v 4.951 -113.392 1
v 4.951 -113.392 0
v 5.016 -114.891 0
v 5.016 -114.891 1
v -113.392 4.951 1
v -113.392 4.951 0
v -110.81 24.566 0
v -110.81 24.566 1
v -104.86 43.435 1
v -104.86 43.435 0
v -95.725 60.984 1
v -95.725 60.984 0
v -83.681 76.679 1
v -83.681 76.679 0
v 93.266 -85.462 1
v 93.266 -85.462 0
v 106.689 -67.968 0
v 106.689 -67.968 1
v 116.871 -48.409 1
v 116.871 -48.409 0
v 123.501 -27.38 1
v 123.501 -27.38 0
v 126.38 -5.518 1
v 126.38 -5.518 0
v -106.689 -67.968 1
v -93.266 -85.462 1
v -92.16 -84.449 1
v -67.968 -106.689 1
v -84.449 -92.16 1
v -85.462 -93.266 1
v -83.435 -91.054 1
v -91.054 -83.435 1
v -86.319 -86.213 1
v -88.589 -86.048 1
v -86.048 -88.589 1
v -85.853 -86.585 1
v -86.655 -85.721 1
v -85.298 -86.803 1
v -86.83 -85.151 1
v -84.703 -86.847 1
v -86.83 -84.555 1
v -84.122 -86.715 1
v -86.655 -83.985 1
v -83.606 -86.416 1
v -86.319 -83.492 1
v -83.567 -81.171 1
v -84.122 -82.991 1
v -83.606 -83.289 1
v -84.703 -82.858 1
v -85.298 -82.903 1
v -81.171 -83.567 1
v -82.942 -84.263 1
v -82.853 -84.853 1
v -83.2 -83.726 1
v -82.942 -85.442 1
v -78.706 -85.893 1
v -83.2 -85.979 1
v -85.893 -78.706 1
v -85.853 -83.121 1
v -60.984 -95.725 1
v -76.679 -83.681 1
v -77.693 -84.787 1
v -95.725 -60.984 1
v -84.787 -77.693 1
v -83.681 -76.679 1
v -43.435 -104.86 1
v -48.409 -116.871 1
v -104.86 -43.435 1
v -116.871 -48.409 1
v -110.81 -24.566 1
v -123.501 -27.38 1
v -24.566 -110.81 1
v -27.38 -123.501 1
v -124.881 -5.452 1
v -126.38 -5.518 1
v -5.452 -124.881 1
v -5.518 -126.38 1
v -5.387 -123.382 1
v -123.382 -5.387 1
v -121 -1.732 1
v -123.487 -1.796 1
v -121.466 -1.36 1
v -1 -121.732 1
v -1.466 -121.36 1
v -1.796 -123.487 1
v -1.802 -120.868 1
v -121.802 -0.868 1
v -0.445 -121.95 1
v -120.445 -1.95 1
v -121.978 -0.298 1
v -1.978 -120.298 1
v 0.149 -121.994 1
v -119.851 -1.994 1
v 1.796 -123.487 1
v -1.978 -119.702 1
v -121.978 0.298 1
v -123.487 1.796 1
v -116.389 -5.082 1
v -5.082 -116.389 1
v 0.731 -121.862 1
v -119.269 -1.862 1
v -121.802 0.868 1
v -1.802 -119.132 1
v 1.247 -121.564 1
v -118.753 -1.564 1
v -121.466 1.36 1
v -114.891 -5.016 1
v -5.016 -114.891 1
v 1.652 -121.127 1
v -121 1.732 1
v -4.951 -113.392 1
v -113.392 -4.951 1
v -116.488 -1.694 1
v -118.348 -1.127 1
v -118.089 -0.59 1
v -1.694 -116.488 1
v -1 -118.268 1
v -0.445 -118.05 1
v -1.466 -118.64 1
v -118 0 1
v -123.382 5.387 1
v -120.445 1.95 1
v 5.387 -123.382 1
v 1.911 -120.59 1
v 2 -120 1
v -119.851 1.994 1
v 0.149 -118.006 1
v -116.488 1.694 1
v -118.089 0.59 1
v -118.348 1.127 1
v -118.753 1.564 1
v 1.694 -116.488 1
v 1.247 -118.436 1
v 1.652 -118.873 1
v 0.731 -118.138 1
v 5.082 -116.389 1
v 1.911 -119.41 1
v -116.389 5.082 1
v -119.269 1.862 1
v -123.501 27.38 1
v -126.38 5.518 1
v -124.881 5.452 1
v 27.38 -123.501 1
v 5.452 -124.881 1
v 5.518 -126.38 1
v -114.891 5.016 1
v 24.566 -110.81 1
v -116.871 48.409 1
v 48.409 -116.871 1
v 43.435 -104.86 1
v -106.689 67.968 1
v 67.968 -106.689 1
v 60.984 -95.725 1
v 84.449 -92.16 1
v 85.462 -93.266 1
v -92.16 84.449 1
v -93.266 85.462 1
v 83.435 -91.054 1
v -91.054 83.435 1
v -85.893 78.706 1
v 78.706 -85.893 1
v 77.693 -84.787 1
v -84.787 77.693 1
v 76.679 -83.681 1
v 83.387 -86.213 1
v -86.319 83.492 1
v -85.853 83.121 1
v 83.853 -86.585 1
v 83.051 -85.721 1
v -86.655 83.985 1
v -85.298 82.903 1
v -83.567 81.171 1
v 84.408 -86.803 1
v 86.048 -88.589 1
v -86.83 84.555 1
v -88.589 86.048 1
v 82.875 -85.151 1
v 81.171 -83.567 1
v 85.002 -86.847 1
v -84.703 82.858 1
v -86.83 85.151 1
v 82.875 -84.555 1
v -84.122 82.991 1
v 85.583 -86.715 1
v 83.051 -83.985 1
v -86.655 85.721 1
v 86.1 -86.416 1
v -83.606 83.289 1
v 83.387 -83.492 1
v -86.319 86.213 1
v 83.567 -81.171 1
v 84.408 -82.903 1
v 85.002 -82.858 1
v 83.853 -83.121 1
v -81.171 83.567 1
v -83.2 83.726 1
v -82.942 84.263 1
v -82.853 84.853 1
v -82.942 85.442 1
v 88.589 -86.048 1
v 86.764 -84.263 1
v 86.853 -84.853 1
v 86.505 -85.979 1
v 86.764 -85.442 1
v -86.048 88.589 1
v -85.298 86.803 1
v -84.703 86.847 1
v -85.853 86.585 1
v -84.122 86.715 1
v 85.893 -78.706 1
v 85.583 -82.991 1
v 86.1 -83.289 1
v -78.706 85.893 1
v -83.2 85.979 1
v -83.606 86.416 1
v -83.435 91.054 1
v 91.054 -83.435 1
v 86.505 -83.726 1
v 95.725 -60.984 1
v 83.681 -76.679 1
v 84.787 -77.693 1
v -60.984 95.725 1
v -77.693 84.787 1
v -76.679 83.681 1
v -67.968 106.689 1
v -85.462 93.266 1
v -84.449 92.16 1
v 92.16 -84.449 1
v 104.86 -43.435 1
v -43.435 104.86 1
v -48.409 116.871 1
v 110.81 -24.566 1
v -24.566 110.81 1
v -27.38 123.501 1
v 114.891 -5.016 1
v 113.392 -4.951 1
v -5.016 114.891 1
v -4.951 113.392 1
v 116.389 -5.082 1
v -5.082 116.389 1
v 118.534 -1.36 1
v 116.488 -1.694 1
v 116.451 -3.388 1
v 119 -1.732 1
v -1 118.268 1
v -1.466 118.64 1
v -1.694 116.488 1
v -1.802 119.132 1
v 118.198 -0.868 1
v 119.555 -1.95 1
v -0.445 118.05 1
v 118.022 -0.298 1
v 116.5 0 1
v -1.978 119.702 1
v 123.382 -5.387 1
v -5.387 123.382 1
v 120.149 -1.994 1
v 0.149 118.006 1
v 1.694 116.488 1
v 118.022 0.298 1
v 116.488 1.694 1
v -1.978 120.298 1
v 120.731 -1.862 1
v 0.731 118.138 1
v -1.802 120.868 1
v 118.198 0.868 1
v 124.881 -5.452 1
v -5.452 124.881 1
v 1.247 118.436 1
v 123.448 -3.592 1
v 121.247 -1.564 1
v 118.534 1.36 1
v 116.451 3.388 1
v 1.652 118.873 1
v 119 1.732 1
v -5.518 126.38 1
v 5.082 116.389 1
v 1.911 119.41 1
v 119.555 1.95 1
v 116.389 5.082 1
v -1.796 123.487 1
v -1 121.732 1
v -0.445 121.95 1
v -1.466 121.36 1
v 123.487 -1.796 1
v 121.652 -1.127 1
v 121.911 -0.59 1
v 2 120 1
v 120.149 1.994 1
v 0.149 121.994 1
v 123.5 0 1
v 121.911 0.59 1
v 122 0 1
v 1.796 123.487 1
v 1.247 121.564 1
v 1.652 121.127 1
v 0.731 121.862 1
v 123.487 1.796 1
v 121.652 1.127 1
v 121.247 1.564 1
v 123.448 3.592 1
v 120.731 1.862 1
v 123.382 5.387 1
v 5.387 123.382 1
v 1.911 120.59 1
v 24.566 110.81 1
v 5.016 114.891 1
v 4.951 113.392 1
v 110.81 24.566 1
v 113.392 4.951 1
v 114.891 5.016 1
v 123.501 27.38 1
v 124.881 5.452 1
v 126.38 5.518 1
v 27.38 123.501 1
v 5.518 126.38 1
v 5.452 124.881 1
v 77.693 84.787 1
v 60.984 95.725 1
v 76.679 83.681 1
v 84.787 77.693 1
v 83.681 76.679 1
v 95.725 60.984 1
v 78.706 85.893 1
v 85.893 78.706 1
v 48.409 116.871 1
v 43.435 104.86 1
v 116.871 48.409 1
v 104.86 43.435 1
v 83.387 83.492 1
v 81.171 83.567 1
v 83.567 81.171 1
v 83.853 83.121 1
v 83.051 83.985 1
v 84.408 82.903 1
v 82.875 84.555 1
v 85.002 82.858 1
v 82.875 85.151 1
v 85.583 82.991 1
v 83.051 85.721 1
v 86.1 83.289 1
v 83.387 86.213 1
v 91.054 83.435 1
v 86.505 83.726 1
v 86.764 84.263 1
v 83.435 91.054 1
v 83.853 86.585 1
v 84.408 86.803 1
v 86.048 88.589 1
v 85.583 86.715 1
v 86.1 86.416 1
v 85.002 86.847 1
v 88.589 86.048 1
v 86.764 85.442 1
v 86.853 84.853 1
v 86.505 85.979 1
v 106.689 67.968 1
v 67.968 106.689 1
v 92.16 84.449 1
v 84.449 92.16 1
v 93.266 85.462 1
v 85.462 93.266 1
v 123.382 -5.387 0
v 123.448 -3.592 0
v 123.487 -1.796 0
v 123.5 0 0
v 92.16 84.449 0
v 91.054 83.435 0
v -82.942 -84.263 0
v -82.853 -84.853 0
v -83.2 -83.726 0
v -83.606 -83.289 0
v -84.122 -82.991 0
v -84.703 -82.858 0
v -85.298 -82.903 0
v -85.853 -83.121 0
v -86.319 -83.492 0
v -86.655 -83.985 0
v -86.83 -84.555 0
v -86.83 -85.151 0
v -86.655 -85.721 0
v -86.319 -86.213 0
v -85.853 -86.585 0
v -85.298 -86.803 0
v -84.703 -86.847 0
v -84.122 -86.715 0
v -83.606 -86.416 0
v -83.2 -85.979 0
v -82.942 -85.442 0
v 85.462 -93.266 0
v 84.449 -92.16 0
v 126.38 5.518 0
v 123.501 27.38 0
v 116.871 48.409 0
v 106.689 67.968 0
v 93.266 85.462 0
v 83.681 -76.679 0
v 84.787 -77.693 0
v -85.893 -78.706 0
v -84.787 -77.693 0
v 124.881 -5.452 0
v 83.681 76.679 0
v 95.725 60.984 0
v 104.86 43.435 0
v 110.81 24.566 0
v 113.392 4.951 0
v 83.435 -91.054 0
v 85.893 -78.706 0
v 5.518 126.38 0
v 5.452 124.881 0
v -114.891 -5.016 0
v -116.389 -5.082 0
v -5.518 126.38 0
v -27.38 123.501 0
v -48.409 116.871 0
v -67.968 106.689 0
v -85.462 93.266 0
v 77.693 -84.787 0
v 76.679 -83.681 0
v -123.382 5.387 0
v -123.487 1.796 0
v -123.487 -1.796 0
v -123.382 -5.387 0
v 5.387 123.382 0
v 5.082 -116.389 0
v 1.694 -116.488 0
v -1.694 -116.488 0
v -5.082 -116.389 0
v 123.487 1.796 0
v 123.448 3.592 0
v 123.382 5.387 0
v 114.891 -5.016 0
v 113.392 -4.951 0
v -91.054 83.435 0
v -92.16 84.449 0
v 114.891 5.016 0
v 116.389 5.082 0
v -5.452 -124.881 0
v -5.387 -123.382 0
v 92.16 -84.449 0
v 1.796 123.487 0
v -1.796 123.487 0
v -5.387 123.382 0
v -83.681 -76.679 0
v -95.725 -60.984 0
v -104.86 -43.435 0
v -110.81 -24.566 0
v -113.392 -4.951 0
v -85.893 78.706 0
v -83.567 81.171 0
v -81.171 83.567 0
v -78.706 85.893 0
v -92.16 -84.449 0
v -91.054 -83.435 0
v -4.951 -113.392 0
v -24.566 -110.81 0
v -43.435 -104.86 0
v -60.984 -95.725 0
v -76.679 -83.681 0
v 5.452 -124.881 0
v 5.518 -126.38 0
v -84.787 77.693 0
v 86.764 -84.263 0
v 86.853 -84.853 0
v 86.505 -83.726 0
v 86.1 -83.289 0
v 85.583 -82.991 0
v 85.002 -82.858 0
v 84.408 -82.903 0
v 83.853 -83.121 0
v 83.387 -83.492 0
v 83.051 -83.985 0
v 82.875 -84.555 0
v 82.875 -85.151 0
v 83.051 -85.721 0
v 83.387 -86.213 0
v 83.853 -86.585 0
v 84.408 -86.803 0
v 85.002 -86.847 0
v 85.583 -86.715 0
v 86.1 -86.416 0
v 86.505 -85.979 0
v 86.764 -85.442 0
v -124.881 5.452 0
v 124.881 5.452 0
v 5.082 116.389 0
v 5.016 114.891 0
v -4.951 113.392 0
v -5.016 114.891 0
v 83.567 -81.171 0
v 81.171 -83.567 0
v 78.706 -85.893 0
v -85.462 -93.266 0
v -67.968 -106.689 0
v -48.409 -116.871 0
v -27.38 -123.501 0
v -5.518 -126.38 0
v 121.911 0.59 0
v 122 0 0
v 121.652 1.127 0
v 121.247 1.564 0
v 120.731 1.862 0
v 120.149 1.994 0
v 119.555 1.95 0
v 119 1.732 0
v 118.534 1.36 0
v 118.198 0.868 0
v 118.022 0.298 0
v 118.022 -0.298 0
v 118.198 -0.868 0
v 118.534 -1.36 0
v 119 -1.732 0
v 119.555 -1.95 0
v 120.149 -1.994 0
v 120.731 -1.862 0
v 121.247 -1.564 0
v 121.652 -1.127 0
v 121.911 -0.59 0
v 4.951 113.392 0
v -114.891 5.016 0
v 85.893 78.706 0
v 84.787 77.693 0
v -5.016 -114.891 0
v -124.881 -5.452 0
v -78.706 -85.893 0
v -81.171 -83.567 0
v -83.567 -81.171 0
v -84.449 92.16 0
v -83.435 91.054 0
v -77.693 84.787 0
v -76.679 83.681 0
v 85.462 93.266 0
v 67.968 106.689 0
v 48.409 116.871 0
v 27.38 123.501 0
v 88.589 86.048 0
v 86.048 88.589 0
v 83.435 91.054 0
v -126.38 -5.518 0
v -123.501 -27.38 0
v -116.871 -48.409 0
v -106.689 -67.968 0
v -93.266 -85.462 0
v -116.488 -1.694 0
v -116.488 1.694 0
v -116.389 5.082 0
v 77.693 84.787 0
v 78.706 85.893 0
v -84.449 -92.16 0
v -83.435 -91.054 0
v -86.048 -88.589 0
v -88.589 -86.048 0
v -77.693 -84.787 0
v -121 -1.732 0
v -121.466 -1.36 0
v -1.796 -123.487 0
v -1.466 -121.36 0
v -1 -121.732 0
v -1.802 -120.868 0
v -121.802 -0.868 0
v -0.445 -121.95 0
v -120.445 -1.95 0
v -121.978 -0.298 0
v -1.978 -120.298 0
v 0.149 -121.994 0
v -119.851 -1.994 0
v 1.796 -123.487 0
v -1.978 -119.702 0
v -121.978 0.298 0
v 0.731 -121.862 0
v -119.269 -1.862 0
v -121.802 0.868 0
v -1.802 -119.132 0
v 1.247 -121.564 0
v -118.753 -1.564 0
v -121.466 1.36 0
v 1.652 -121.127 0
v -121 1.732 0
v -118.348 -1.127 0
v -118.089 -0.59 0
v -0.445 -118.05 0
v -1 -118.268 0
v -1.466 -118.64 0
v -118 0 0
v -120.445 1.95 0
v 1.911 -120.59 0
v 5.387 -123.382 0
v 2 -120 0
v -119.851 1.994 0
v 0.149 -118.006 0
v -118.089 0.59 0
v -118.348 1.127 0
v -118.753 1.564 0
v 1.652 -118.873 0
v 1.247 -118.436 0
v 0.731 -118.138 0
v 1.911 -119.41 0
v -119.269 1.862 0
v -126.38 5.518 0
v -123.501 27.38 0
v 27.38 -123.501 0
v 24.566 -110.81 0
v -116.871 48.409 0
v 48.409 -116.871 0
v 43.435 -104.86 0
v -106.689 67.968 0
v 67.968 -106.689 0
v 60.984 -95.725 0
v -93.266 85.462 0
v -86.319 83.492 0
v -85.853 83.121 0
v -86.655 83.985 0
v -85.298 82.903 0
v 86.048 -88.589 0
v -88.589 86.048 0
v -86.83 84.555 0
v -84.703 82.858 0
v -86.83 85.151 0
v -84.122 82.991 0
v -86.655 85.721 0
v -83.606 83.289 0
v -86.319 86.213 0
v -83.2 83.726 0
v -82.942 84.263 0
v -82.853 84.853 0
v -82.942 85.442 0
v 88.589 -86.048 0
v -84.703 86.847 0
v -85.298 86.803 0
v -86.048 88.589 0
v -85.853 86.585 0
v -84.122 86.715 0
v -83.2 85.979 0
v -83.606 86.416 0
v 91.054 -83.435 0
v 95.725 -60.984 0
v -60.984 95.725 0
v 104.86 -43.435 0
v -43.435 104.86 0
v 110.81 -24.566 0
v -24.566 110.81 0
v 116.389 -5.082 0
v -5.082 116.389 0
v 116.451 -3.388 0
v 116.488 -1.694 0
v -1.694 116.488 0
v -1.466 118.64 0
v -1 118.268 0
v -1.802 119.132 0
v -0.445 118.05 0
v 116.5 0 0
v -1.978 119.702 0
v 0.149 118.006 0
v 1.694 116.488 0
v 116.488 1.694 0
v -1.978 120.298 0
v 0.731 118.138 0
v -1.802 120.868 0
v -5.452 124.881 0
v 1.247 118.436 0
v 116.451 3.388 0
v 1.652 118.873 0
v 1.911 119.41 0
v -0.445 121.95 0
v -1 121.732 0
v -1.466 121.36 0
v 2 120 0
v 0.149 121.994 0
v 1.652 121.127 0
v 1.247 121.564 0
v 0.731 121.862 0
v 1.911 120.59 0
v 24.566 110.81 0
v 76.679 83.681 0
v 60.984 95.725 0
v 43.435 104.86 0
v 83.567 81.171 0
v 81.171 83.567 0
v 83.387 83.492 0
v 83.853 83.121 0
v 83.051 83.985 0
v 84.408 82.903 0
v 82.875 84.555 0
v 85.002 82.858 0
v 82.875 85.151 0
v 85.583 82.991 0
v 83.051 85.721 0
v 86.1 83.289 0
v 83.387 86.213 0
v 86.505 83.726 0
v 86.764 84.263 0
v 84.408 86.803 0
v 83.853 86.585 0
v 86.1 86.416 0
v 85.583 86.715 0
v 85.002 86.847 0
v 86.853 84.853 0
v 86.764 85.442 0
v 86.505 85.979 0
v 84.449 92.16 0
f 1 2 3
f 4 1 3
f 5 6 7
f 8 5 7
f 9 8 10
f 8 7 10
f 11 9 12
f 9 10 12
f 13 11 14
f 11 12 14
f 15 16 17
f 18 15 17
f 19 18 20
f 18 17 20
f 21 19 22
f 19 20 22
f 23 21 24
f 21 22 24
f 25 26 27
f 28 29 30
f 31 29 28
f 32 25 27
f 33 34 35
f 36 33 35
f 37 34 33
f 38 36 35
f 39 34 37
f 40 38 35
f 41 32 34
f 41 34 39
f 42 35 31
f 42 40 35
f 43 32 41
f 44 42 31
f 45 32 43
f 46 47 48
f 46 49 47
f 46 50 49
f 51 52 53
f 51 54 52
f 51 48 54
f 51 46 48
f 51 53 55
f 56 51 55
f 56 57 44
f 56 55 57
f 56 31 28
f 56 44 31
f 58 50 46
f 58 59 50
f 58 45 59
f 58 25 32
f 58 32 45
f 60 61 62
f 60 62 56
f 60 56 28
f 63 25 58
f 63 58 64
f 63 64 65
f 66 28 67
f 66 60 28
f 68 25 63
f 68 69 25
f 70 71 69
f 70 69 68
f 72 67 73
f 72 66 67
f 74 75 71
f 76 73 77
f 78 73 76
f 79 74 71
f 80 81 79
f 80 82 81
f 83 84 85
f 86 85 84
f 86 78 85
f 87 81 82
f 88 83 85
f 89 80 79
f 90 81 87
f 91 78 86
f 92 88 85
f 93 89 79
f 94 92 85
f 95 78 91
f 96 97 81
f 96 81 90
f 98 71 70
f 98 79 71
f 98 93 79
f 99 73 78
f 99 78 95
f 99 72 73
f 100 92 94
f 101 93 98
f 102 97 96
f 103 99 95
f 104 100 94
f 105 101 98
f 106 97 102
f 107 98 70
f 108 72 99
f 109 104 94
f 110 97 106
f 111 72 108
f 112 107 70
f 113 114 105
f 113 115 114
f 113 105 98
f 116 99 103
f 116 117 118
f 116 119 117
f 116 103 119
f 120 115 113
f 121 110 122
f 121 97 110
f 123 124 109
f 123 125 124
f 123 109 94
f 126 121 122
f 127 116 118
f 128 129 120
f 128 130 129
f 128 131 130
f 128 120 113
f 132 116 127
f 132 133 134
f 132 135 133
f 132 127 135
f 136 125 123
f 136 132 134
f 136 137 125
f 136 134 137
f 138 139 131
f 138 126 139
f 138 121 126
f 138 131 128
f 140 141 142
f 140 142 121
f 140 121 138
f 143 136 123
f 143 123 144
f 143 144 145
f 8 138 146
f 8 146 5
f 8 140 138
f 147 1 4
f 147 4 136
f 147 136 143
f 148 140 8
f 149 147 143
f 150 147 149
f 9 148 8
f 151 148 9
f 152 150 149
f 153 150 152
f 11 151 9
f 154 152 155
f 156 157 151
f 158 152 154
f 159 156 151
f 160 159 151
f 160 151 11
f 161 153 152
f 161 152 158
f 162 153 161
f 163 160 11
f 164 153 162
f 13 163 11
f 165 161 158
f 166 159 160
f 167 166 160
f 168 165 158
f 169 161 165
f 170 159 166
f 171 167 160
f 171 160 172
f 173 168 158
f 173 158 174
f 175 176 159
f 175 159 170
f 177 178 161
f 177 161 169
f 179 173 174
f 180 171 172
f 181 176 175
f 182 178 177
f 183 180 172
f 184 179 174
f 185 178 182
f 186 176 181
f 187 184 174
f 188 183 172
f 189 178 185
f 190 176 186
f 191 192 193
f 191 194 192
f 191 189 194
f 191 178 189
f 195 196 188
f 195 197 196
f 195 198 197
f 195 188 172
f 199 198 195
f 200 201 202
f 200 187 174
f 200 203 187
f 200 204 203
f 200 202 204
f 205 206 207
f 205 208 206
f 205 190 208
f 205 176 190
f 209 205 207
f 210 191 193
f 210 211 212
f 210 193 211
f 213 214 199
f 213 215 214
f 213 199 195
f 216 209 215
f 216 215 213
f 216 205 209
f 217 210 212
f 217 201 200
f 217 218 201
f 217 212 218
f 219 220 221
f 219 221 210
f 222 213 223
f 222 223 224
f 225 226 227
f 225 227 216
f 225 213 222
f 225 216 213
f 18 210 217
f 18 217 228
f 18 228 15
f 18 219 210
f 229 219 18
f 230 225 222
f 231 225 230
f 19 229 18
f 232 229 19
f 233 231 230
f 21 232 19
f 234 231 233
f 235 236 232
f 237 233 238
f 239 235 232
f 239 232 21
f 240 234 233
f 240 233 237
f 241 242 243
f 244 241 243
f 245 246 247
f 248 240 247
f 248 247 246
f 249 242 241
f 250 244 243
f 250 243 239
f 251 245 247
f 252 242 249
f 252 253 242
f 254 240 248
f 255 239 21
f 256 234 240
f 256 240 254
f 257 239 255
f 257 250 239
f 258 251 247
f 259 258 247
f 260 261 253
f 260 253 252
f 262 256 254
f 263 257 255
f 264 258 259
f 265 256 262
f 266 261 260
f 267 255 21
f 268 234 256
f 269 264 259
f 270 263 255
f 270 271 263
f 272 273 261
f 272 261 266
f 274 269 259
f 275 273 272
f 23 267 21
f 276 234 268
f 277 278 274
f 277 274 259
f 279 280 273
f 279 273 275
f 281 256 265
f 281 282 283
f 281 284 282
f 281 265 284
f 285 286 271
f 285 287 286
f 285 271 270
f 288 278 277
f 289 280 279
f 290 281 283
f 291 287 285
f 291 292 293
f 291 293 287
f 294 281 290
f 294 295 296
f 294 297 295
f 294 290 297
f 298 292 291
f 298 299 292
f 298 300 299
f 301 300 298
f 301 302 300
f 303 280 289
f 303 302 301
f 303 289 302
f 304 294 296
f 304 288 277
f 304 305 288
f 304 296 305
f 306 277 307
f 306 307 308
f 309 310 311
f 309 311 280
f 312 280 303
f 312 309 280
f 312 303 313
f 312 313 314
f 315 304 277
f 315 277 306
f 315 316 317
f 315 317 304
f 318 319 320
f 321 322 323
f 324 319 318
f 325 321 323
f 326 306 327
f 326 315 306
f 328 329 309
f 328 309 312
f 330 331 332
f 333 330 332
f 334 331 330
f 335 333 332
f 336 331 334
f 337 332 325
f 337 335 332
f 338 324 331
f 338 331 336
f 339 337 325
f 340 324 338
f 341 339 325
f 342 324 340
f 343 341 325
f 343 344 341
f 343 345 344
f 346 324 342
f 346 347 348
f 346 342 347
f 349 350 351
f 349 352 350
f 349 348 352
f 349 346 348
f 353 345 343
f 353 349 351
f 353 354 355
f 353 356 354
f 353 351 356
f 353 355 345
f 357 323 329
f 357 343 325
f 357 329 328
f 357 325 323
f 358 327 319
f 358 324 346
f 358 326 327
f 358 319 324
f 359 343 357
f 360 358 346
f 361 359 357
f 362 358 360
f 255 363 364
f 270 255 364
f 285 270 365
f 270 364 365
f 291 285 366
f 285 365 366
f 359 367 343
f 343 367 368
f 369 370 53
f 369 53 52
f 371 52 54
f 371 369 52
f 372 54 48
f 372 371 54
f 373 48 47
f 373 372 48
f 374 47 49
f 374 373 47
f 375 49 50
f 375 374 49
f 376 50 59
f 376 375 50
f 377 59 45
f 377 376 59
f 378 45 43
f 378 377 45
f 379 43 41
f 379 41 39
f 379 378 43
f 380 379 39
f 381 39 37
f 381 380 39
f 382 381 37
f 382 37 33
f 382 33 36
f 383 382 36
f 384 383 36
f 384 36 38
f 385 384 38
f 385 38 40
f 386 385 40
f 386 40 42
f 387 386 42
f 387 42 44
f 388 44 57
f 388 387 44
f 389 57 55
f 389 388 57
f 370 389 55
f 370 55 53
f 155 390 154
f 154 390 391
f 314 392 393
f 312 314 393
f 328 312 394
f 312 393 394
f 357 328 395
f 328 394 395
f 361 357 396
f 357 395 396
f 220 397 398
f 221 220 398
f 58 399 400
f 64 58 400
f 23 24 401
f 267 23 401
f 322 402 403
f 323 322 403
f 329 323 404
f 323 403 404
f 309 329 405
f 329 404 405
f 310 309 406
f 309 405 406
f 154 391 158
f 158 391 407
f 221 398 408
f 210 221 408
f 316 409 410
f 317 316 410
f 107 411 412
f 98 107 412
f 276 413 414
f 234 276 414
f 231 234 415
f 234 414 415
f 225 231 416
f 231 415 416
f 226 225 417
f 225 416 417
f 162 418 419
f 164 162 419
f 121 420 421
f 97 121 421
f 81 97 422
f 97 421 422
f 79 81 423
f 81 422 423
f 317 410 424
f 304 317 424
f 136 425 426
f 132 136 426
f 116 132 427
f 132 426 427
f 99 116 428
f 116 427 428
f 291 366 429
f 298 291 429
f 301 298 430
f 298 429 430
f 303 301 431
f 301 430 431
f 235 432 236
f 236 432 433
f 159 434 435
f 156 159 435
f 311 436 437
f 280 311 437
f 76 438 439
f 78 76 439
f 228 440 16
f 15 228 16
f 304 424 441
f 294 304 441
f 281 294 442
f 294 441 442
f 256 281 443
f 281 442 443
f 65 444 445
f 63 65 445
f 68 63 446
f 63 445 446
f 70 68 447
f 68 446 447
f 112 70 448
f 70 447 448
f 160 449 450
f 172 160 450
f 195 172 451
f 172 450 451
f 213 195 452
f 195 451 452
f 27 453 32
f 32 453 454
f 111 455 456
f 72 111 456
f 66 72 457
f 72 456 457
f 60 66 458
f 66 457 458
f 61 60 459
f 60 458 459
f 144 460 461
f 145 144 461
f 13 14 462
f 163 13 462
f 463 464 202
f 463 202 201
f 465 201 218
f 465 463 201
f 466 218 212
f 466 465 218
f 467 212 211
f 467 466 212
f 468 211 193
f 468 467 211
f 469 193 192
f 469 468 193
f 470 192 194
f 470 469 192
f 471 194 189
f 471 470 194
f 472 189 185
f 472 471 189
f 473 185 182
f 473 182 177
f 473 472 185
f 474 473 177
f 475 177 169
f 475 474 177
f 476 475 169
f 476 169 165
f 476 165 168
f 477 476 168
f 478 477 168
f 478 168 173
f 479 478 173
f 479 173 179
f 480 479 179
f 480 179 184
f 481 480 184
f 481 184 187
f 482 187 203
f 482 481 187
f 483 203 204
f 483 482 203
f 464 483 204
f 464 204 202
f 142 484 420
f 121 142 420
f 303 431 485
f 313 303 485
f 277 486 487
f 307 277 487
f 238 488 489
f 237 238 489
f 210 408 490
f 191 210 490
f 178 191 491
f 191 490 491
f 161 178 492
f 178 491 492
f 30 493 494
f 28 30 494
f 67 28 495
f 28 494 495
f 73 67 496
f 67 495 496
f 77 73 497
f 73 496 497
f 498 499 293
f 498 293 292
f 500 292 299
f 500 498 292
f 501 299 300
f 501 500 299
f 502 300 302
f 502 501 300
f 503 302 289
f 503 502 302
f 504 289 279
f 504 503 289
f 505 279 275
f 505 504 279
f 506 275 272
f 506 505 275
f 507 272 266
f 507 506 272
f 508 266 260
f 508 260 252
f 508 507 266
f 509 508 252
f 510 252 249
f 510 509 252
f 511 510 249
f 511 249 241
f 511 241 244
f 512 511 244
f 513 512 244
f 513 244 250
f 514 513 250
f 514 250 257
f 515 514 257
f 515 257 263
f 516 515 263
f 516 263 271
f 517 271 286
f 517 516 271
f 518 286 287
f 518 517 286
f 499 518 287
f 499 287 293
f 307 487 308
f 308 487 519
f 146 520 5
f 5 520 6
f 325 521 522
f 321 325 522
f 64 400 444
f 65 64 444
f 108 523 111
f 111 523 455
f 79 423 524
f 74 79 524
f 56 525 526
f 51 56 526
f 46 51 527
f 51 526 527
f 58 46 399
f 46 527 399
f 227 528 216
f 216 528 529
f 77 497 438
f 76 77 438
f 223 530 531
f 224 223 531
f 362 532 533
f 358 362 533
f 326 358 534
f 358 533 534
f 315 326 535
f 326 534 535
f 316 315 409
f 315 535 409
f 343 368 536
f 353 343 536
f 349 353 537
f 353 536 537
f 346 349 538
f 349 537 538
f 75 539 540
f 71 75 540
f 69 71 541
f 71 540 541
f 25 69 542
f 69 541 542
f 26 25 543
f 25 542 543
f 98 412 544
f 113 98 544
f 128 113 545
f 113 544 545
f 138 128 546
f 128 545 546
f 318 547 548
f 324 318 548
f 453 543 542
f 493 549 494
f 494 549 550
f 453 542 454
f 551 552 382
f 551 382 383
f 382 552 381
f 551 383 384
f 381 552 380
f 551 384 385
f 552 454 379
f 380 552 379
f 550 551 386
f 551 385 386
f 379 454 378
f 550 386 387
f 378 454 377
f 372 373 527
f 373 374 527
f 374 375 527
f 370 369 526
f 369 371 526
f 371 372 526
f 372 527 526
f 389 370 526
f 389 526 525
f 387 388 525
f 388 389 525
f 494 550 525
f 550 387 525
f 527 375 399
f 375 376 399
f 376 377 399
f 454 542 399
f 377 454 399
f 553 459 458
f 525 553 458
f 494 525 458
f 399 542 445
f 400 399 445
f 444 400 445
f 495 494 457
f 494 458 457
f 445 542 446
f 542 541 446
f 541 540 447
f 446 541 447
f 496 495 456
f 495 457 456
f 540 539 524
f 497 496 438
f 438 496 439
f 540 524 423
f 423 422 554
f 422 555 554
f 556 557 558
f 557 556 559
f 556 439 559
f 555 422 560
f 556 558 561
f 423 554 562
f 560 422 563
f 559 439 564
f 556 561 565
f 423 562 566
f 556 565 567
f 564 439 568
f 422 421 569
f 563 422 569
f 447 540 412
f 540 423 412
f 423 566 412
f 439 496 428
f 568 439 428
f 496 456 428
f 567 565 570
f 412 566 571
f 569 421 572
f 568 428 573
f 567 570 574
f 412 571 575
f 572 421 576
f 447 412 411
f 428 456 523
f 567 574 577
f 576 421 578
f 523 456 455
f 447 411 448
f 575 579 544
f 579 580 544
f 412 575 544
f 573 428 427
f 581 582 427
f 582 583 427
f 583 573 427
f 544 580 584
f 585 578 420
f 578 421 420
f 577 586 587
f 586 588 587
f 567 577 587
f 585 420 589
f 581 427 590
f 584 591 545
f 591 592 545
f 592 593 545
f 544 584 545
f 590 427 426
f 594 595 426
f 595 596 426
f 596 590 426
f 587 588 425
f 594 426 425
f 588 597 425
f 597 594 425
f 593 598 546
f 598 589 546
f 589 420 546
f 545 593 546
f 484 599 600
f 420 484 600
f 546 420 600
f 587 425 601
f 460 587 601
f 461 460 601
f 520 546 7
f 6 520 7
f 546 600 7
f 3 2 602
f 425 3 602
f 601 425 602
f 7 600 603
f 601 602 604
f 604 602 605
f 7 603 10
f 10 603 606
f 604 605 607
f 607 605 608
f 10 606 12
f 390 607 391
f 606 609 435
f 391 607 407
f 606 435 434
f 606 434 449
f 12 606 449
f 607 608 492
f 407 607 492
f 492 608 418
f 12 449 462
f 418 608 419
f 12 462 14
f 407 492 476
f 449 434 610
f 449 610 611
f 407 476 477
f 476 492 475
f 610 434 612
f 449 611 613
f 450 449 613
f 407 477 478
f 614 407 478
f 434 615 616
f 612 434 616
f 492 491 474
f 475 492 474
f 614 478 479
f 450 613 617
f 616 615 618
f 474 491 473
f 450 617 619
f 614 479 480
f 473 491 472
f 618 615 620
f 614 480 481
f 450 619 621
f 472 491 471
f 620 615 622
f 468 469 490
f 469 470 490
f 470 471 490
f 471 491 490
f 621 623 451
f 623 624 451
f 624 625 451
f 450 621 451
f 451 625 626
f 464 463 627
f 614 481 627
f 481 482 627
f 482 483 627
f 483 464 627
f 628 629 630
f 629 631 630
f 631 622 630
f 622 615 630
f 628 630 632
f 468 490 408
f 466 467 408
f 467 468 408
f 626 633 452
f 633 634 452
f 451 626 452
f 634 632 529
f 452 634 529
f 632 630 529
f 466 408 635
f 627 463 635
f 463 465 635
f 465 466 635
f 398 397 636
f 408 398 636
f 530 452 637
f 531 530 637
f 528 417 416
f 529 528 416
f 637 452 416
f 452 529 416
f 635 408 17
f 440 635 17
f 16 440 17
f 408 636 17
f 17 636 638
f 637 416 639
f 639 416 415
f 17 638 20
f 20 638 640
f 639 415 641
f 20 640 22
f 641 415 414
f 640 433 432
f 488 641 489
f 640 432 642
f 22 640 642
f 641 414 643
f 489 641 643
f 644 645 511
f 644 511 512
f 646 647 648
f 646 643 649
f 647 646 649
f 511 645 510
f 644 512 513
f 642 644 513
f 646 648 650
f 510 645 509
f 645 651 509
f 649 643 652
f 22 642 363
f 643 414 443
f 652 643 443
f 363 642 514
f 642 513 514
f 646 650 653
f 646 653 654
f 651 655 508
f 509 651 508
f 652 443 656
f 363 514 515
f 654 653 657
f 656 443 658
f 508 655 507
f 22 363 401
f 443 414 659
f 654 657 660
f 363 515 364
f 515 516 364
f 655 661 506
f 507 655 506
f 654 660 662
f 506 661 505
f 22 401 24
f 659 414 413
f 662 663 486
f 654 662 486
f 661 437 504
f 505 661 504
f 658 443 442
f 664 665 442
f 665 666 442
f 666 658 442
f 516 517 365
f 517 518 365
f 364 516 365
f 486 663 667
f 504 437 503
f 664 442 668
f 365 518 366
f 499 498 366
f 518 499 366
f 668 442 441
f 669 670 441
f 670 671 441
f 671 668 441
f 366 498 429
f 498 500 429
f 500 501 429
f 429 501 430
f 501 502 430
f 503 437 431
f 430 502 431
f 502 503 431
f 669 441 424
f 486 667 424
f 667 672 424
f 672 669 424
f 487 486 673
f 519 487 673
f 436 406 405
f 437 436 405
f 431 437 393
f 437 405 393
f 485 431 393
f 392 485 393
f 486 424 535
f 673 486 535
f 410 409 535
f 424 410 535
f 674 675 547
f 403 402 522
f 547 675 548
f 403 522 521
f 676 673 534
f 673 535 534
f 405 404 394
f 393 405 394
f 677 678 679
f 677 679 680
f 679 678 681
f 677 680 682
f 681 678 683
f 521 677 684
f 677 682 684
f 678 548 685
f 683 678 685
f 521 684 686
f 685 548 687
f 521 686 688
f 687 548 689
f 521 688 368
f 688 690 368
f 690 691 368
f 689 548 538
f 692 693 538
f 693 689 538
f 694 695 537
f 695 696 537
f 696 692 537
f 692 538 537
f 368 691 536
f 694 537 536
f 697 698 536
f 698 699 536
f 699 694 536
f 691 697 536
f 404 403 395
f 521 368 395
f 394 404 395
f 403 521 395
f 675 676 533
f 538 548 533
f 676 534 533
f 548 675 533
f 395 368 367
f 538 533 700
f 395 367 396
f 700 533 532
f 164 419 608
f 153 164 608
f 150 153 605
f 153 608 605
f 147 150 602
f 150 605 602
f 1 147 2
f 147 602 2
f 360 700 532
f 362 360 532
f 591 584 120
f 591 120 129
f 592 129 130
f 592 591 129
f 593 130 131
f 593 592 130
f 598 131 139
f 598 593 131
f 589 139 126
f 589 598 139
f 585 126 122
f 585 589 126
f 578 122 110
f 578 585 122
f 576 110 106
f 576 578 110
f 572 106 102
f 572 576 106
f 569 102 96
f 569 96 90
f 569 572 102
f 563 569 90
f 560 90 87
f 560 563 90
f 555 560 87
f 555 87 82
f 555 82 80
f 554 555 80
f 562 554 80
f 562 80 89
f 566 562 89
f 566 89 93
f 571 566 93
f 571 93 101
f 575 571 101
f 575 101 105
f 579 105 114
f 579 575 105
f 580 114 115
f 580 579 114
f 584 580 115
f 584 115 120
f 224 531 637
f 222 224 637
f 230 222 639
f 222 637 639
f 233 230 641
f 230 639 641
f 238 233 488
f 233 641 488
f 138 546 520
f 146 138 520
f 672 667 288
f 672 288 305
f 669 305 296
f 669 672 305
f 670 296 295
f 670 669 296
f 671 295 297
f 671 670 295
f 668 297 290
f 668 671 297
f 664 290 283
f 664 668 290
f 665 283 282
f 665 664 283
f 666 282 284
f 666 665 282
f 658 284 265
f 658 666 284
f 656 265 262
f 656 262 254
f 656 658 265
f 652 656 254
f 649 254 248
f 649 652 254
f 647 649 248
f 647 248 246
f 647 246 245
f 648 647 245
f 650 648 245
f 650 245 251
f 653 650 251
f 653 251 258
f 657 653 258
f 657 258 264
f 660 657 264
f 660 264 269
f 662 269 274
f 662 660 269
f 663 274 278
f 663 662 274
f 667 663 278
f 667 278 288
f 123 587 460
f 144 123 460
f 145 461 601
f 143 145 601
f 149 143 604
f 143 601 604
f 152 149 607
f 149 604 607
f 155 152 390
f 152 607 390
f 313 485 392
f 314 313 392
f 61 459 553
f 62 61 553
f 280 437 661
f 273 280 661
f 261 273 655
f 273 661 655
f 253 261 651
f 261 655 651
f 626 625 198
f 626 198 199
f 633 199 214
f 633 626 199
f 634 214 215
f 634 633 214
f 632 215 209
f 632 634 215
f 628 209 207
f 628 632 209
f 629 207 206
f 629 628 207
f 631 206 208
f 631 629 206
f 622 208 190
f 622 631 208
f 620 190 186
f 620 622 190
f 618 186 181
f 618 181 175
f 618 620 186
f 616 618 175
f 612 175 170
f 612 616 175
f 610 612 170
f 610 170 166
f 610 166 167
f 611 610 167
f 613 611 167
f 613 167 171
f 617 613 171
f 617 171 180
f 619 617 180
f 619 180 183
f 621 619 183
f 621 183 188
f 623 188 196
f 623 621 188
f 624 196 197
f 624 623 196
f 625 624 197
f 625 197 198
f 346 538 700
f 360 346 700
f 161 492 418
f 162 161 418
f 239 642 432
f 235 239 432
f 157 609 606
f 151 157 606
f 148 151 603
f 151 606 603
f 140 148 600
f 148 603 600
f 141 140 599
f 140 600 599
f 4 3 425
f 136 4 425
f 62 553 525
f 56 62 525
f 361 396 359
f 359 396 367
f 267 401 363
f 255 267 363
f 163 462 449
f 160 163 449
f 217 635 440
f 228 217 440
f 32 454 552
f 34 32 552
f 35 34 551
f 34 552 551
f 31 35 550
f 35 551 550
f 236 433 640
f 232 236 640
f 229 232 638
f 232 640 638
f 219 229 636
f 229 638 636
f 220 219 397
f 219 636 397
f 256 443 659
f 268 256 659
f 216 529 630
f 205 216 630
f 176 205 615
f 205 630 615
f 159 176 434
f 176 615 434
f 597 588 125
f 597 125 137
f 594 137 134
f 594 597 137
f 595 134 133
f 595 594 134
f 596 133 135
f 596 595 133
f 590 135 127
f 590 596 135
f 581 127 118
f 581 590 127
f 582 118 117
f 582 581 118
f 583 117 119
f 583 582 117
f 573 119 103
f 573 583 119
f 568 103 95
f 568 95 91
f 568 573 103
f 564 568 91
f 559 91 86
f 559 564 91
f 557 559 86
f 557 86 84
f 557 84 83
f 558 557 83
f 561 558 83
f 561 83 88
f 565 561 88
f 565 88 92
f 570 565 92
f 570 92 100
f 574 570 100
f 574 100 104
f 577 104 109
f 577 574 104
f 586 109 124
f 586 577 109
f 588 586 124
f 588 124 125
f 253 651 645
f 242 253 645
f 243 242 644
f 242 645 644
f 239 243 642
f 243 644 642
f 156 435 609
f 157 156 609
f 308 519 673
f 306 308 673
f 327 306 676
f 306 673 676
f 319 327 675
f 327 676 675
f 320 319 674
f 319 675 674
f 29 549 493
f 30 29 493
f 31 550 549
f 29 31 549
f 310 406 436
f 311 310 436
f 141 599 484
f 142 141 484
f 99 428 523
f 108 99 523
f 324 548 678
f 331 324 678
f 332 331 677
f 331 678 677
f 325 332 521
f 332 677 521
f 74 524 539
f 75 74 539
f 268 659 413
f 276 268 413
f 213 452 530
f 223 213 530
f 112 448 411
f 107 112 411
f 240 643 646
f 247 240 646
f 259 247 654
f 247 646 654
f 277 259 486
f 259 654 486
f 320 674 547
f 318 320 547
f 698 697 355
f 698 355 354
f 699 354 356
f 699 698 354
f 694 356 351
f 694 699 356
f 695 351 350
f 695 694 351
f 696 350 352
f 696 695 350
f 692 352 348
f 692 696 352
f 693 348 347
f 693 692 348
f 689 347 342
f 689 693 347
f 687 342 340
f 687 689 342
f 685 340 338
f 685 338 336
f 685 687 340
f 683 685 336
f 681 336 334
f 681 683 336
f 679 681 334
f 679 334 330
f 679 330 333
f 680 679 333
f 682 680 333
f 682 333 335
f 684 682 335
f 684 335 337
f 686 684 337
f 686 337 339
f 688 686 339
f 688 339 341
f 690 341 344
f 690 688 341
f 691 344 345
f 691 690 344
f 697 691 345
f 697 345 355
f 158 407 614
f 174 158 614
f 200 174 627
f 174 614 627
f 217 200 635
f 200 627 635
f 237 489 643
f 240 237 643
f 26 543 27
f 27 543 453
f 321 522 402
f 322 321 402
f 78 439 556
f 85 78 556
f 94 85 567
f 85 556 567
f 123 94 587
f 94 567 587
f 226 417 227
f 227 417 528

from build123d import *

# Parameters (mm, degrees)
F0_R     = 2
F1_DEPTH = 1


with BuildPart() as f1:
    # F0 (on Top) → F1 (new body)
    with BuildSketch(Plane.XY):
        with BuildLine():
            Line((5.0816586281, 116.3891178143), (5.3869943396, 123.3824553654))
            ThreePointArc((5.3869943396, 123.3824553654), (0, 123.5), (-5.3869943396, 123.3824553654))
            Line((-5.3869943396, 123.3824553654), (-5.0816586281, 116.3891178143))
            ThreePointArc((-5.0816586281, 116.3891178143), (0, 116.5), (5.0816586281, 116.3891178143))
        make_face()
        with Locations((0, 120)):
            Circle(F0_R, mode=Mode.SUBTRACT)
        with BuildLine():
            Line((-78.7062591872, 85.8928097384), (-83.4353906405, 91.0537510961))
            ThreePointArc((-83.4353906405, 91.0537510961), (-87.3276874765, 87.3276874765), (-91.0537510961, 83.4353906405))
            Line((-91.0537510961, 83.4353906405), (-85.8928097384, 78.7062591872))
            ThreePointArc((-85.8928097384, 78.7062591872), (-82.3779400082, 82.3779400082), (-78.7062591872, 85.8928097384))
        make_face()
        with Locations((-84.8528137424, 84.8528137424)):
            Circle(F0_R, mode=Mode.SUBTRACT)
        with BuildLine():
            Line((85.8928097384, 78.7062591872), (91.0537510961, 83.4353906405))
            ThreePointArc((91.0537510961, 83.4353906405), (87.3276874765, 87.3276874765), (83.4353906405, 91.0537510961))
            Line((83.4353906405, 91.0537510961), (78.7062591872, 85.8928097384))
            ThreePointArc((78.7062591872, 85.8928097384), (82.3779400082, 82.3779400082), (85.8928097384, 78.7062591872))
        make_face()
        with Locations((84.8528137424, 84.8528137424)):
            Circle(F0_R, mode=Mode.SUBTRACT)
        with BuildLine():
            ThreePointArc((123.5, 0), (123.4706103444, 2.6941383018), (123.3824553654, 5.3869943396))
            Line((123.3824553654, 5.3869943396), (116.3891178143, 5.0816586281))
            ThreePointArc((116.3891178143, 5.0816586281), (116.4722761548, 2.5414341065), (116.5, 0))
            ThreePointArc((116.5, 0), (116.4722761548, -2.5414341065), (116.3891178143, -5.0816586281))
            Line((116.3891178143, -5.0816586281), (123.3824553654, -5.3869943396))
            ThreePointArc((123.3824553654, -5.3869943396), (123.4706103444, -2.6941383018), (123.5, 0))
        make_face()
        with Locations((120, 0)):
            Circle(F0_R, mode=Mode.SUBTRACT)
        with BuildLine():
            ThreePointArc((83.4353906405, -91.0537510961), (87.3276874765, -87.3276874765), (91.0537510961, -83.4353906405))
            Line((91.0537510961, -83.4353906405), (85.8928097384, -78.7062591872))
            ThreePointArc((85.8928097384, -78.7062591872), (82.3779400082, -82.3779400082), (78.7062591872, -85.8928097384))
            Line((78.7062591872, -85.8928097384), (83.4353906405, -91.0537510961))
        make_face()
        with Locations((84.8528137424, -84.8528137424)):
            Circle(F0_R, mode=Mode.SUBTRACT)
        with BuildLine():
            ThreePointArc((-5.3869943396, -123.3824553654), (0, -123.5), (5.3869943396, -123.3824553654))
            Line((5.3869943396, -123.3824553654), (5.0816586281, -116.3891178143))
            ThreePointArc((5.0816586281, -116.3891178143), (0, -116.5), (-5.0816586281, -116.3891178143))
            Line((-5.0816586281, -116.3891178143), (-5.3869943396, -123.3824553654))
        make_face()
        with Locations((0, -120)):
            Circle(F0_R, mode=Mode.SUBTRACT)
        with BuildLine():
            ThreePointArc((-91.0537510961, -83.4353906405), (-87.3276874765, -87.3276874765), (-83.4353906405, -91.0537510961))
            Line((-83.4353906405, -91.0537510961), (-78.7062591872, -85.8928097384))
            ThreePointArc((-78.7062591872, -85.8928097384), (-82.3779400082, -82.3779400082), (-85.8928097384, -78.7062591872))
            Line((-85.8928097384, -78.7062591872), (-91.0537510961, -83.4353906405))
        make_face()
        with Locations((-84.8528137424, -84.8528137424)):
            Circle(F0_R, mode=Mode.SUBTRACT)
        with BuildLine():
            Line((-116.3891178143, 5.0816586281), (-123.3824553654, 5.3869943396))
            ThreePointArc((-123.3824553654, 5.3869943396), (-123.5, 0), (-123.3824553654, -5.3869943396))
            Line((-123.3824553654, -5.3869943396), (-116.3891178143, -5.0816586281))
            ThreePointArc((-116.3891178143, -5.0816586281), (-116.5, 0), (-116.3891178143, 5.0816586281))
        make_face()
        with Locations((-120, 0)):
            Circle(F0_R, mode=Mode.SUBTRACT)
        with BuildLine():
            ThreePointArc((-84.448775952, 92.1596671013), (-47.8354290456, 115.4849415639), (-5.4524234207, 124.8810276977))
            Line((-5.4524234207, 124.8810276977), (-5.5178525017, 126.3796000301))
            ThreePointArc((-5.5178525017, 126.3796000301), (-48.4094541942, 116.8707608627), (-85.4621612634, 93.2655831065))
            Line((-85.4621612634, 93.2655831065), (-84.448775952, 92.1596671013))
        make_face()
        with BuildLine():
            Line((-5.3869943396, 123.3824553654), (-5.4524234207, 124.8810276977))
            ThreePointArc((-5.4524234207, 124.8810276977), (-47.8354290456, 115.4849415639), (-84.448775952, 92.1596671013))
            Line((-84.448775952, 92.1596671013), (-83.4353906405, 91.0537510961))
            ThreePointArc((-83.4353906405, 91.0537510961), (-47.2614038971, 114.0991222651), (-5.3869943396, 123.3824553654))
        make_face()
        with BuildLine():
            Line((-5.0816586281, 116.3891178143), (-5.3869943396, 123.3824553654))
            ThreePointArc((-5.3869943396, 123.3824553654), (-47.2614038971, 114.0991222651), (-83.4353906405, 91.0537510961))
            Line((-83.4353906405, 91.0537510961), (-78.7062591872, 85.8928097384))
            ThreePointArc((-78.7062591872, 85.8928097384), (-44.5826198705, 107.6319655376), (-5.0816586281, 116.3891178143))
        make_face()
        with BuildLine():
            Line((-5.016229547, 114.8905454819), (-5.0816586281, 116.3891178143))
            ThreePointArc((-5.0816586281, 116.3891178143), (-44.5826198705, 107.6319655376), (-78.7062591872, 85.8928097384))
            Line((-78.7062591872, 85.8928097384), (-77.6928738758, 84.7868937332))
            ThreePointArc((-77.6928738758, 84.7868937332), (-44.008594722, 106.2461462388), (-5.016229547, 114.8905454819))
        make_face()
        with BuildLine():
            ThreePointArc((-76.6794885644, 83.6809777279), (-43.4345695734, 104.86032694), (-4.950800466, 113.3919731495))
            Line((-4.950800466, 113.3919731495), (-5.016229547, 114.8905454819))
            ThreePointArc((-5.016229547, 114.8905454819), (-44.008594722, 106.2461462388), (-77.6928738758, 84.7868937332))
            Line((-77.6928738758, 84.7868937332), (-76.6794885644, 83.6809777279))
        make_face()
        with BuildLine():
            Line((76.6794885644, 83.6809777279), (77.6928738758, 84.7868937332))
            ThreePointArc((77.6928738758, 84.7868937332), (44.008594722, 106.2461462388), (5.016229547, 114.8905454819))
            Line((5.016229547, 114.8905454819), (4.950800466, 113.3919731495))
            ThreePointArc((4.950800466, 113.3919731495), (43.4345695734, 104.86032694), (76.6794885644, 83.6809777279))
        make_face()
        with BuildLine():
            Line((77.6928738758, 84.7868937332), (78.7062591872, 85.8928097384))
            ThreePointArc((78.7062591872, 85.8928097384), (44.5826198705, 107.6319655376), (5.0816586281, 116.3891178143))
            Line((5.0816586281, 116.3891178143), (5.016229547, 114.8905454819))
            ThreePointArc((5.016229547, 114.8905454819), (44.008594722, 106.2461462388), (77.6928738758, 84.7868937332))
        make_face()
        with BuildLine():
            Line((78.7062591872, 85.8928097384), (83.4353906405, 91.0537510961))
            ThreePointArc((83.4353906405, 91.0537510961), (47.2614038971, 114.0991222651), (5.3869943396, 123.3824553654))
            Line((5.3869943396, 123.3824553654), (5.0816586281, 116.3891178143))
            ThreePointArc((5.0816586281, 116.3891178143), (44.5826198705, 107.6319655376), (78.7062591872, 85.8928097384))
        make_face()
        with BuildLine():
            Line((83.4353906405, 91.0537510961), (84.448775952, 92.1596671013))
            ThreePointArc((84.448775952, 92.1596671013), (47.8354290456, 115.4849415639), (5.4524234207, 124.8810276977))
            Line((5.4524234207, 124.8810276977), (5.3869943396, 123.3824553654))
            ThreePointArc((5.3869943396, 123.3824553654), (47.2614038971, 114.0991222651), (83.4353906405, 91.0537510961))
        make_face()
        with BuildLine():
            ThreePointArc((5.4524234207, 124.8810276977), (47.8354290456, 115.4849415639), (84.448775952, 92.1596671013))
            Line((84.448775952, 92.1596671013), (85.4621612634, 93.2655831065))
            ThreePointArc((85.4621612634, 93.2655831065), (48.4094541942, 116.8707608627), (5.5178525017, 126.3796000301))
            Line((5.5178525017, 126.3796000301), (5.4524234207, 124.8810276977))
        make_face()
        with BuildLine():
            Line((113.3919731495, 4.950800466), (114.8905454819, 5.016229547))
            ThreePointArc((114.8905454819, 5.016229547), (106.2461462388, 44.008594722), (84.7868937332, 77.6928738758))
            Line((84.7868937332, 77.6928738758), (83.6809777279, 76.6794885644))
            ThreePointArc((83.6809777279, 76.6794885644), (104.86032694, 43.4345695734), (113.3919731495, 4.950800466))
        make_face()
        with BuildLine():
            Line((114.8905454819, 5.016229547), (116.3891178143, 5.0816586281))
            ThreePointArc((116.3891178143, 5.0816586281), (107.6319655376, 44.5826198705), (85.8928097384, 78.7062591872))
            Line((85.8928097384, 78.7062591872), (84.7868937332, 77.6928738758))
            ThreePointArc((84.7868937332, 77.6928738758), (106.2461462388, 44.008594722), (114.8905454819, 5.016229547))
        make_face()
        with BuildLine():
            Line((116.3891178143, 5.0816586281), (123.3824553654, 5.3869943396))
            ThreePointArc((123.3824553654, 5.3869943396), (114.0991222651, 47.2614038971), (91.0537510961, 83.4353906405))
            Line((91.0537510961, 83.4353906405), (85.8928097384, 78.7062591872))
            ThreePointArc((85.8928097384, 78.7062591872), (107.6319655376, 44.5826198705), (116.3891178143, 5.0816586281))
        make_face()
        with BuildLine():
            Line((123.3824553654, 5.3869943396), (124.8810276977, 5.4524234207))
            ThreePointArc((124.8810276977, 5.4524234207), (115.4849415639, 47.8354290456), (92.1596671013, 84.448775952))
            Line((92.1596671013, 84.448775952), (91.0537510961, 83.4353906405))
            ThreePointArc((91.0537510961, 83.4353906405), (114.0991222651, 47.2614038971), (123.3824553654, 5.3869943396))
        make_face()
        with BuildLine():
            ThreePointArc((92.1596671013, 84.448775952), (115.4849415639, 47.8354290456), (124.8810276977, 5.4524234207))
            Line((124.8810276977, 5.4524234207), (126.3796000301, 5.5178525017))
            ThreePointArc((126.3796000301, 5.5178525017), (116.8707608627, 48.4094541942), (93.2655831065, 85.4621612634))
            Line((93.2655831065, 85.4621612634), (92.1596671013, 84.448775952))
        make_face()
        with BuildLine():
            ThreePointArc((84.7868937332, -77.6928738758), (106.2461462388, -44.008594722), (114.8905454819, -5.016229547))
            Line((114.8905454819, -5.016229547), (113.3919731495, -4.950800466))
            ThreePointArc((113.3919731495, -4.950800466), (104.86032694, -43.4345695734), (83.6809777279, -76.6794885644))
            Line((83.6809777279, -76.6794885644), (84.7868937332, -77.6928738758))
        make_face()
        with BuildLine():
            ThreePointArc((85.8928097384, -78.7062591872), (107.6319655376, -44.5826198705), (116.3891178143, -5.0816586281))
            Line((116.3891178143, -5.0816586281), (114.8905454819, -5.016229547))
            ThreePointArc((114.8905454819, -5.016229547), (106.2461462388, -44.008594722), (84.7868937332, -77.6928738758))
            Line((84.7868937332, -77.6928738758), (85.8928097384, -78.7062591872))
        make_face()
        with BuildLine():
            ThreePointArc((91.0537510961, -83.4353906405), (114.0991222651, -47.2614038971), (123.3824553654, -5.3869943396))
            Line((123.3824553654, -5.3869943396), (116.3891178143, -5.0816586281))
            ThreePointArc((116.3891178143, -5.0816586281), (107.6319655376, -44.5826198705), (85.8928097384, -78.7062591872))
            Line((85.8928097384, -78.7062591872), (91.0537510961, -83.4353906405))
        make_face()
        with BuildLine():
            ThreePointArc((92.1596671013, -84.448775952), (115.4849415639, -47.8354290456), (124.8810276977, -5.4524234207))
            Line((124.8810276977, -5.4524234207), (123.3824553654, -5.3869943396))
            ThreePointArc((123.3824553654, -5.3869943396), (114.0991222651, -47.2614038971), (91.0537510961, -83.4353906405))
            Line((91.0537510961, -83.4353906405), (92.1596671013, -84.448775952))
        make_face()
        with BuildLine():
            Line((126.3796000301, -5.5178525017), (124.8810276977, -5.4524234207))
            ThreePointArc((124.8810276977, -5.4524234207), (115.4849415639, -47.8354290456), (92.1596671013, -84.448775952))
            Line((92.1596671013, -84.448775952), (93.2655831065, -85.4621612634))
            ThreePointArc((93.2655831065, -85.4621612634), (116.8707608627, -48.4094541942), (126.3796000301, -5.5178525017))
        make_face()
        with BuildLine():
            ThreePointArc((5.016229547, -114.8905454819), (44.008594722, -106.2461462388), (77.6928738758, -84.7868937332))
            Line((77.6928738758, -84.7868937332), (76.6794885644, -83.6809777279))
            ThreePointArc((76.6794885644, -83.6809777279), (43.4345695734, -104.86032694), (4.950800466, -113.3919731495))
            Line((4.950800466, -113.3919731495), (5.016229547, -114.8905454819))
        make_face()
        with BuildLine():
            ThreePointArc((5.0816586281, -116.3891178143), (44.5826198705, -107.6319655376), (78.7062591872, -85.8928097384))
            Line((78.7062591872, -85.8928097384), (77.6928738758, -84.7868937332))
            ThreePointArc((77.6928738758, -84.7868937332), (44.008594722, -106.2461462388), (5.016229547, -114.8905454819))
            Line((5.016229547, -114.8905454819), (5.0816586281, -116.3891178143))
        make_face()
        with BuildLine():
            ThreePointArc((5.3869943396, -123.3824553654), (47.2614038971, -114.0991222651), (83.4353906405, -91.0537510961))
            Line((83.4353906405, -91.0537510961), (78.7062591872, -85.8928097384))
            ThreePointArc((78.7062591872, -85.8928097384), (44.5826198705, -107.6319655376), (5.0816586281, -116.3891178143))
            Line((5.0816586281, -116.3891178143), (5.3869943396, -123.3824553654))
        make_face()
        with BuildLine():
            ThreePointArc((5.4524234207, -124.8810276977), (47.8354290456, -115.4849415639), (84.448775952, -92.1596671013))
            Line((84.448775952, -92.1596671013), (83.4353906405, -91.0537510961))
            ThreePointArc((83.4353906405, -91.0537510961), (47.2614038971, -114.0991222651), (5.3869943396, -123.3824553654))
            Line((5.3869943396, -123.3824553654), (5.4524234207, -124.8810276977))
        make_face()
        with BuildLine():
            Line((85.4621612634, -93.2655831065), (84.448775952, -92.1596671013))
            ThreePointArc((84.448775952, -92.1596671013), (47.8354290456, -115.4849415639), (5.4524234207, -124.8810276977))
            Line((5.4524234207, -124.8810276977), (5.5178525017, -126.3796000301))
            ThreePointArc((5.5178525017, -126.3796000301), (48.4094541942, -116.8707608627), (85.4621612634, -93.2655831065))
        make_face()
        with BuildLine():
            ThreePointArc((-4.950800466, -113.3919731495), (-43.4345695734, -104.86032694), (-76.6794885644, -83.6809777279))
            Line((-76.6794885644, -83.6809777279), (-77.6928738758, -84.7868937332))
            ThreePointArc((-77.6928738758, -84.7868937332), (-44.008594722, -106.2461462388), (-5.016229547, -114.8905454819))
            Line((-5.016229547, -114.8905454819), (-4.950800466, -113.3919731495))
        make_face()
        with BuildLine():
            ThreePointArc((-78.7062591872, -85.8928097384), (-44.5826198705, -107.6319655376), (-5.0816586281, -116.3891178143))
            Line((-5.0816586281, -116.3891178143), (-5.016229547, -114.8905454819))
            ThreePointArc((-5.016229547, -114.8905454819), (-44.008594722, -106.2461462388), (-77.6928738758, -84.7868937332))
            Line((-77.6928738758, -84.7868937332), (-78.7062591872, -85.8928097384))
        make_face()
        with BuildLine():
            ThreePointArc((-83.4353906405, -91.0537510961), (-47.2614038971, -114.0991222651), (-5.3869943396, -123.3824553654))
            Line((-5.3869943396, -123.3824553654), (-5.0816586281, -116.3891178143))
            ThreePointArc((-5.0816586281, -116.3891178143), (-44.5826198705, -107.6319655376), (-78.7062591872, -85.8928097384))
            Line((-78.7062591872, -85.8928097384), (-83.4353906405, -91.0537510961))
        make_face()
        with BuildLine():
            ThreePointArc((-84.448775952, -92.1596671013), (-47.8354290456, -115.4849415639), (-5.4524234207, -124.8810276977))
            Line((-5.4524234207, -124.8810276977), (-5.3869943396, -123.3824553654))
            ThreePointArc((-5.3869943396, -123.3824553654), (-47.2614038971, -114.0991222651), (-83.4353906405, -91.0537510961))
            Line((-83.4353906405, -91.0537510961), (-84.448775952, -92.1596671013))
        make_face()
        with BuildLine():
            Line((-5.5178525017, -126.3796000301), (-5.4524234207, -124.8810276977))
            ThreePointArc((-5.4524234207, -124.8810276977), (-47.8354290456, -115.4849415639), (-84.448775952, -92.1596671013))
            Line((-84.448775952, -92.1596671013), (-85.4621612634, -93.2655831065))
            ThreePointArc((-85.4621612634, -93.2655831065), (-48.4094541942, -116.8707608627), (-5.5178525017, -126.3796000301))
        make_face()
        with BuildLine():
            ThreePointArc((-123.3824553654, -5.3869943396), (-114.0991222651, -47.2614038971), (-91.0537510961, -83.4353906405))
            Line((-91.0537510961, -83.4353906405), (-85.8928097384, -78.7062591872))
            ThreePointArc((-85.8928097384, -78.7062591872), (-107.6319655376, -44.5826198705), (-116.3891178143, -5.0816586281))
            Line((-116.3891178143, -5.0816586281), (-123.3824553654, -5.3869943396))
        make_face()
        with BuildLine():
            ThreePointArc((-124.8810276977, -5.4524234207), (-115.4849415639, -47.8354290456), (-92.1596671013, -84.448775952))
            Line((-92.1596671013, -84.448775952), (-91.0537510961, -83.4353906405))
            ThreePointArc((-91.0537510961, -83.4353906405), (-114.0991222651, -47.2614038971), (-123.3824553654, -5.3869943396))
            Line((-123.3824553654, -5.3869943396), (-124.8810276977, -5.4524234207))
        make_face()
        with BuildLine():
            Line((-93.2655831065, -85.4621612634), (-92.1596671013, -84.448775952))
            ThreePointArc((-92.1596671013, -84.448775952), (-115.4849415639, -47.8354290456), (-124.8810276977, -5.4524234207))
            Line((-124.8810276977, -5.4524234207), (-126.3796000301, -5.5178525017))
            ThreePointArc((-126.3796000301, -5.5178525017), (-116.8707608627, -48.4094541942), (-93.2655831065, -85.4621612634))
        make_face()
        with BuildLine():
            ThreePointArc((-84.7868937332, -77.6928738758), (-106.2461462388, -44.008594722), (-114.8905454819, -5.016229547))
            Line((-114.8905454819, -5.016229547), (-116.3891178143, -5.0816586281))
            ThreePointArc((-116.3891178143, -5.0816586281), (-107.6319655376, -44.5826198705), (-85.8928097384, -78.7062591872))
            Line((-85.8928097384, -78.7062591872), (-84.7868937332, -77.6928738758))
        make_face()
        with BuildLine():
            ThreePointArc((-83.6809777279, -76.6794885644), (-104.86032694, -43.4345695734), (-113.3919731495, -4.950800466))
            Line((-113.3919731495, -4.950800466), (-114.8905454819, -5.016229547))
            ThreePointArc((-114.8905454819, -5.016229547), (-106.2461462388, -44.008594722), (-84.7868937332, -77.6928738758))
            Line((-84.7868937332, -77.6928738758), (-83.6809777279, -76.6794885644))
        make_face()
        with BuildLine():
            ThreePointArc((-124.8810276977, 5.4524234207), (-115.4849415639, 47.8354290456), (-92.1596671013, 84.448775952))
            Line((-92.1596671013, 84.448775952), (-93.2655831065, 85.4621612634))
            ThreePointArc((-93.2655831065, 85.4621612634), (-116.8707608627, 48.4094541942), (-126.3796000301, 5.5178525017))
            Line((-126.3796000301, 5.5178525017), (-124.8810276977, 5.4524234207))
        make_face()
        with BuildLine():
            Line((-91.0537510961, 83.4353906405), (-92.1596671013, 84.448775952))
            ThreePointArc((-92.1596671013, 84.448775952), (-115.4849415639, 47.8354290456), (-124.8810276977, 5.4524234207))
            Line((-124.8810276977, 5.4524234207), (-123.3824553654, 5.3869943396))
            ThreePointArc((-123.3824553654, 5.3869943396), (-114.0991222651, 47.2614038971), (-91.0537510961, 83.4353906405))
        make_face()
        with BuildLine():
            Line((-85.8928097384, 78.7062591872), (-91.0537510961, 83.4353906405))
            ThreePointArc((-91.0537510961, 83.4353906405), (-114.0991222651, 47.2614038971), (-123.3824553654, 5.3869943396))
            Line((-123.3824553654, 5.3869943396), (-116.3891178143, 5.0816586281))
            ThreePointArc((-116.3891178143, 5.0816586281), (-107.6319655376, 44.5826198705), (-85.8928097384, 78.7062591872))
        make_face()
        with BuildLine():
            ThreePointArc((-114.8905454819, 5.016229547), (-106.2461462388, 44.008594722), (-84.7868937332, 77.6928738758))
            Line((-84.7868937332, 77.6928738758), (-85.8928097384, 78.7062591872))
            ThreePointArc((-85.8928097384, 78.7062591872), (-107.6319655376, 44.5826198705), (-116.3891178143, 5.0816586281))
            Line((-116.3891178143, 5.0816586281), (-114.8905454819, 5.016229547))
        make_face()
        with BuildLine():
            ThreePointArc((-113.3919731495, 4.950800466), (-104.86032694, 43.4345695734), (-83.6809777279, 76.6794885644))
            Line((-83.6809777279, 76.6794885644), (-84.7868937332, 77.6928738758))
            ThreePointArc((-84.7868937332, 77.6928738758), (-106.2461462388, 44.008594722), (-114.8905454819, 5.016229547))
            Line((-114.8905454819, 5.016229547), (-113.3919731495, 4.950800466))
        make_face()
    extrude(amount=F1_DEPTH)


solid = f1.part
